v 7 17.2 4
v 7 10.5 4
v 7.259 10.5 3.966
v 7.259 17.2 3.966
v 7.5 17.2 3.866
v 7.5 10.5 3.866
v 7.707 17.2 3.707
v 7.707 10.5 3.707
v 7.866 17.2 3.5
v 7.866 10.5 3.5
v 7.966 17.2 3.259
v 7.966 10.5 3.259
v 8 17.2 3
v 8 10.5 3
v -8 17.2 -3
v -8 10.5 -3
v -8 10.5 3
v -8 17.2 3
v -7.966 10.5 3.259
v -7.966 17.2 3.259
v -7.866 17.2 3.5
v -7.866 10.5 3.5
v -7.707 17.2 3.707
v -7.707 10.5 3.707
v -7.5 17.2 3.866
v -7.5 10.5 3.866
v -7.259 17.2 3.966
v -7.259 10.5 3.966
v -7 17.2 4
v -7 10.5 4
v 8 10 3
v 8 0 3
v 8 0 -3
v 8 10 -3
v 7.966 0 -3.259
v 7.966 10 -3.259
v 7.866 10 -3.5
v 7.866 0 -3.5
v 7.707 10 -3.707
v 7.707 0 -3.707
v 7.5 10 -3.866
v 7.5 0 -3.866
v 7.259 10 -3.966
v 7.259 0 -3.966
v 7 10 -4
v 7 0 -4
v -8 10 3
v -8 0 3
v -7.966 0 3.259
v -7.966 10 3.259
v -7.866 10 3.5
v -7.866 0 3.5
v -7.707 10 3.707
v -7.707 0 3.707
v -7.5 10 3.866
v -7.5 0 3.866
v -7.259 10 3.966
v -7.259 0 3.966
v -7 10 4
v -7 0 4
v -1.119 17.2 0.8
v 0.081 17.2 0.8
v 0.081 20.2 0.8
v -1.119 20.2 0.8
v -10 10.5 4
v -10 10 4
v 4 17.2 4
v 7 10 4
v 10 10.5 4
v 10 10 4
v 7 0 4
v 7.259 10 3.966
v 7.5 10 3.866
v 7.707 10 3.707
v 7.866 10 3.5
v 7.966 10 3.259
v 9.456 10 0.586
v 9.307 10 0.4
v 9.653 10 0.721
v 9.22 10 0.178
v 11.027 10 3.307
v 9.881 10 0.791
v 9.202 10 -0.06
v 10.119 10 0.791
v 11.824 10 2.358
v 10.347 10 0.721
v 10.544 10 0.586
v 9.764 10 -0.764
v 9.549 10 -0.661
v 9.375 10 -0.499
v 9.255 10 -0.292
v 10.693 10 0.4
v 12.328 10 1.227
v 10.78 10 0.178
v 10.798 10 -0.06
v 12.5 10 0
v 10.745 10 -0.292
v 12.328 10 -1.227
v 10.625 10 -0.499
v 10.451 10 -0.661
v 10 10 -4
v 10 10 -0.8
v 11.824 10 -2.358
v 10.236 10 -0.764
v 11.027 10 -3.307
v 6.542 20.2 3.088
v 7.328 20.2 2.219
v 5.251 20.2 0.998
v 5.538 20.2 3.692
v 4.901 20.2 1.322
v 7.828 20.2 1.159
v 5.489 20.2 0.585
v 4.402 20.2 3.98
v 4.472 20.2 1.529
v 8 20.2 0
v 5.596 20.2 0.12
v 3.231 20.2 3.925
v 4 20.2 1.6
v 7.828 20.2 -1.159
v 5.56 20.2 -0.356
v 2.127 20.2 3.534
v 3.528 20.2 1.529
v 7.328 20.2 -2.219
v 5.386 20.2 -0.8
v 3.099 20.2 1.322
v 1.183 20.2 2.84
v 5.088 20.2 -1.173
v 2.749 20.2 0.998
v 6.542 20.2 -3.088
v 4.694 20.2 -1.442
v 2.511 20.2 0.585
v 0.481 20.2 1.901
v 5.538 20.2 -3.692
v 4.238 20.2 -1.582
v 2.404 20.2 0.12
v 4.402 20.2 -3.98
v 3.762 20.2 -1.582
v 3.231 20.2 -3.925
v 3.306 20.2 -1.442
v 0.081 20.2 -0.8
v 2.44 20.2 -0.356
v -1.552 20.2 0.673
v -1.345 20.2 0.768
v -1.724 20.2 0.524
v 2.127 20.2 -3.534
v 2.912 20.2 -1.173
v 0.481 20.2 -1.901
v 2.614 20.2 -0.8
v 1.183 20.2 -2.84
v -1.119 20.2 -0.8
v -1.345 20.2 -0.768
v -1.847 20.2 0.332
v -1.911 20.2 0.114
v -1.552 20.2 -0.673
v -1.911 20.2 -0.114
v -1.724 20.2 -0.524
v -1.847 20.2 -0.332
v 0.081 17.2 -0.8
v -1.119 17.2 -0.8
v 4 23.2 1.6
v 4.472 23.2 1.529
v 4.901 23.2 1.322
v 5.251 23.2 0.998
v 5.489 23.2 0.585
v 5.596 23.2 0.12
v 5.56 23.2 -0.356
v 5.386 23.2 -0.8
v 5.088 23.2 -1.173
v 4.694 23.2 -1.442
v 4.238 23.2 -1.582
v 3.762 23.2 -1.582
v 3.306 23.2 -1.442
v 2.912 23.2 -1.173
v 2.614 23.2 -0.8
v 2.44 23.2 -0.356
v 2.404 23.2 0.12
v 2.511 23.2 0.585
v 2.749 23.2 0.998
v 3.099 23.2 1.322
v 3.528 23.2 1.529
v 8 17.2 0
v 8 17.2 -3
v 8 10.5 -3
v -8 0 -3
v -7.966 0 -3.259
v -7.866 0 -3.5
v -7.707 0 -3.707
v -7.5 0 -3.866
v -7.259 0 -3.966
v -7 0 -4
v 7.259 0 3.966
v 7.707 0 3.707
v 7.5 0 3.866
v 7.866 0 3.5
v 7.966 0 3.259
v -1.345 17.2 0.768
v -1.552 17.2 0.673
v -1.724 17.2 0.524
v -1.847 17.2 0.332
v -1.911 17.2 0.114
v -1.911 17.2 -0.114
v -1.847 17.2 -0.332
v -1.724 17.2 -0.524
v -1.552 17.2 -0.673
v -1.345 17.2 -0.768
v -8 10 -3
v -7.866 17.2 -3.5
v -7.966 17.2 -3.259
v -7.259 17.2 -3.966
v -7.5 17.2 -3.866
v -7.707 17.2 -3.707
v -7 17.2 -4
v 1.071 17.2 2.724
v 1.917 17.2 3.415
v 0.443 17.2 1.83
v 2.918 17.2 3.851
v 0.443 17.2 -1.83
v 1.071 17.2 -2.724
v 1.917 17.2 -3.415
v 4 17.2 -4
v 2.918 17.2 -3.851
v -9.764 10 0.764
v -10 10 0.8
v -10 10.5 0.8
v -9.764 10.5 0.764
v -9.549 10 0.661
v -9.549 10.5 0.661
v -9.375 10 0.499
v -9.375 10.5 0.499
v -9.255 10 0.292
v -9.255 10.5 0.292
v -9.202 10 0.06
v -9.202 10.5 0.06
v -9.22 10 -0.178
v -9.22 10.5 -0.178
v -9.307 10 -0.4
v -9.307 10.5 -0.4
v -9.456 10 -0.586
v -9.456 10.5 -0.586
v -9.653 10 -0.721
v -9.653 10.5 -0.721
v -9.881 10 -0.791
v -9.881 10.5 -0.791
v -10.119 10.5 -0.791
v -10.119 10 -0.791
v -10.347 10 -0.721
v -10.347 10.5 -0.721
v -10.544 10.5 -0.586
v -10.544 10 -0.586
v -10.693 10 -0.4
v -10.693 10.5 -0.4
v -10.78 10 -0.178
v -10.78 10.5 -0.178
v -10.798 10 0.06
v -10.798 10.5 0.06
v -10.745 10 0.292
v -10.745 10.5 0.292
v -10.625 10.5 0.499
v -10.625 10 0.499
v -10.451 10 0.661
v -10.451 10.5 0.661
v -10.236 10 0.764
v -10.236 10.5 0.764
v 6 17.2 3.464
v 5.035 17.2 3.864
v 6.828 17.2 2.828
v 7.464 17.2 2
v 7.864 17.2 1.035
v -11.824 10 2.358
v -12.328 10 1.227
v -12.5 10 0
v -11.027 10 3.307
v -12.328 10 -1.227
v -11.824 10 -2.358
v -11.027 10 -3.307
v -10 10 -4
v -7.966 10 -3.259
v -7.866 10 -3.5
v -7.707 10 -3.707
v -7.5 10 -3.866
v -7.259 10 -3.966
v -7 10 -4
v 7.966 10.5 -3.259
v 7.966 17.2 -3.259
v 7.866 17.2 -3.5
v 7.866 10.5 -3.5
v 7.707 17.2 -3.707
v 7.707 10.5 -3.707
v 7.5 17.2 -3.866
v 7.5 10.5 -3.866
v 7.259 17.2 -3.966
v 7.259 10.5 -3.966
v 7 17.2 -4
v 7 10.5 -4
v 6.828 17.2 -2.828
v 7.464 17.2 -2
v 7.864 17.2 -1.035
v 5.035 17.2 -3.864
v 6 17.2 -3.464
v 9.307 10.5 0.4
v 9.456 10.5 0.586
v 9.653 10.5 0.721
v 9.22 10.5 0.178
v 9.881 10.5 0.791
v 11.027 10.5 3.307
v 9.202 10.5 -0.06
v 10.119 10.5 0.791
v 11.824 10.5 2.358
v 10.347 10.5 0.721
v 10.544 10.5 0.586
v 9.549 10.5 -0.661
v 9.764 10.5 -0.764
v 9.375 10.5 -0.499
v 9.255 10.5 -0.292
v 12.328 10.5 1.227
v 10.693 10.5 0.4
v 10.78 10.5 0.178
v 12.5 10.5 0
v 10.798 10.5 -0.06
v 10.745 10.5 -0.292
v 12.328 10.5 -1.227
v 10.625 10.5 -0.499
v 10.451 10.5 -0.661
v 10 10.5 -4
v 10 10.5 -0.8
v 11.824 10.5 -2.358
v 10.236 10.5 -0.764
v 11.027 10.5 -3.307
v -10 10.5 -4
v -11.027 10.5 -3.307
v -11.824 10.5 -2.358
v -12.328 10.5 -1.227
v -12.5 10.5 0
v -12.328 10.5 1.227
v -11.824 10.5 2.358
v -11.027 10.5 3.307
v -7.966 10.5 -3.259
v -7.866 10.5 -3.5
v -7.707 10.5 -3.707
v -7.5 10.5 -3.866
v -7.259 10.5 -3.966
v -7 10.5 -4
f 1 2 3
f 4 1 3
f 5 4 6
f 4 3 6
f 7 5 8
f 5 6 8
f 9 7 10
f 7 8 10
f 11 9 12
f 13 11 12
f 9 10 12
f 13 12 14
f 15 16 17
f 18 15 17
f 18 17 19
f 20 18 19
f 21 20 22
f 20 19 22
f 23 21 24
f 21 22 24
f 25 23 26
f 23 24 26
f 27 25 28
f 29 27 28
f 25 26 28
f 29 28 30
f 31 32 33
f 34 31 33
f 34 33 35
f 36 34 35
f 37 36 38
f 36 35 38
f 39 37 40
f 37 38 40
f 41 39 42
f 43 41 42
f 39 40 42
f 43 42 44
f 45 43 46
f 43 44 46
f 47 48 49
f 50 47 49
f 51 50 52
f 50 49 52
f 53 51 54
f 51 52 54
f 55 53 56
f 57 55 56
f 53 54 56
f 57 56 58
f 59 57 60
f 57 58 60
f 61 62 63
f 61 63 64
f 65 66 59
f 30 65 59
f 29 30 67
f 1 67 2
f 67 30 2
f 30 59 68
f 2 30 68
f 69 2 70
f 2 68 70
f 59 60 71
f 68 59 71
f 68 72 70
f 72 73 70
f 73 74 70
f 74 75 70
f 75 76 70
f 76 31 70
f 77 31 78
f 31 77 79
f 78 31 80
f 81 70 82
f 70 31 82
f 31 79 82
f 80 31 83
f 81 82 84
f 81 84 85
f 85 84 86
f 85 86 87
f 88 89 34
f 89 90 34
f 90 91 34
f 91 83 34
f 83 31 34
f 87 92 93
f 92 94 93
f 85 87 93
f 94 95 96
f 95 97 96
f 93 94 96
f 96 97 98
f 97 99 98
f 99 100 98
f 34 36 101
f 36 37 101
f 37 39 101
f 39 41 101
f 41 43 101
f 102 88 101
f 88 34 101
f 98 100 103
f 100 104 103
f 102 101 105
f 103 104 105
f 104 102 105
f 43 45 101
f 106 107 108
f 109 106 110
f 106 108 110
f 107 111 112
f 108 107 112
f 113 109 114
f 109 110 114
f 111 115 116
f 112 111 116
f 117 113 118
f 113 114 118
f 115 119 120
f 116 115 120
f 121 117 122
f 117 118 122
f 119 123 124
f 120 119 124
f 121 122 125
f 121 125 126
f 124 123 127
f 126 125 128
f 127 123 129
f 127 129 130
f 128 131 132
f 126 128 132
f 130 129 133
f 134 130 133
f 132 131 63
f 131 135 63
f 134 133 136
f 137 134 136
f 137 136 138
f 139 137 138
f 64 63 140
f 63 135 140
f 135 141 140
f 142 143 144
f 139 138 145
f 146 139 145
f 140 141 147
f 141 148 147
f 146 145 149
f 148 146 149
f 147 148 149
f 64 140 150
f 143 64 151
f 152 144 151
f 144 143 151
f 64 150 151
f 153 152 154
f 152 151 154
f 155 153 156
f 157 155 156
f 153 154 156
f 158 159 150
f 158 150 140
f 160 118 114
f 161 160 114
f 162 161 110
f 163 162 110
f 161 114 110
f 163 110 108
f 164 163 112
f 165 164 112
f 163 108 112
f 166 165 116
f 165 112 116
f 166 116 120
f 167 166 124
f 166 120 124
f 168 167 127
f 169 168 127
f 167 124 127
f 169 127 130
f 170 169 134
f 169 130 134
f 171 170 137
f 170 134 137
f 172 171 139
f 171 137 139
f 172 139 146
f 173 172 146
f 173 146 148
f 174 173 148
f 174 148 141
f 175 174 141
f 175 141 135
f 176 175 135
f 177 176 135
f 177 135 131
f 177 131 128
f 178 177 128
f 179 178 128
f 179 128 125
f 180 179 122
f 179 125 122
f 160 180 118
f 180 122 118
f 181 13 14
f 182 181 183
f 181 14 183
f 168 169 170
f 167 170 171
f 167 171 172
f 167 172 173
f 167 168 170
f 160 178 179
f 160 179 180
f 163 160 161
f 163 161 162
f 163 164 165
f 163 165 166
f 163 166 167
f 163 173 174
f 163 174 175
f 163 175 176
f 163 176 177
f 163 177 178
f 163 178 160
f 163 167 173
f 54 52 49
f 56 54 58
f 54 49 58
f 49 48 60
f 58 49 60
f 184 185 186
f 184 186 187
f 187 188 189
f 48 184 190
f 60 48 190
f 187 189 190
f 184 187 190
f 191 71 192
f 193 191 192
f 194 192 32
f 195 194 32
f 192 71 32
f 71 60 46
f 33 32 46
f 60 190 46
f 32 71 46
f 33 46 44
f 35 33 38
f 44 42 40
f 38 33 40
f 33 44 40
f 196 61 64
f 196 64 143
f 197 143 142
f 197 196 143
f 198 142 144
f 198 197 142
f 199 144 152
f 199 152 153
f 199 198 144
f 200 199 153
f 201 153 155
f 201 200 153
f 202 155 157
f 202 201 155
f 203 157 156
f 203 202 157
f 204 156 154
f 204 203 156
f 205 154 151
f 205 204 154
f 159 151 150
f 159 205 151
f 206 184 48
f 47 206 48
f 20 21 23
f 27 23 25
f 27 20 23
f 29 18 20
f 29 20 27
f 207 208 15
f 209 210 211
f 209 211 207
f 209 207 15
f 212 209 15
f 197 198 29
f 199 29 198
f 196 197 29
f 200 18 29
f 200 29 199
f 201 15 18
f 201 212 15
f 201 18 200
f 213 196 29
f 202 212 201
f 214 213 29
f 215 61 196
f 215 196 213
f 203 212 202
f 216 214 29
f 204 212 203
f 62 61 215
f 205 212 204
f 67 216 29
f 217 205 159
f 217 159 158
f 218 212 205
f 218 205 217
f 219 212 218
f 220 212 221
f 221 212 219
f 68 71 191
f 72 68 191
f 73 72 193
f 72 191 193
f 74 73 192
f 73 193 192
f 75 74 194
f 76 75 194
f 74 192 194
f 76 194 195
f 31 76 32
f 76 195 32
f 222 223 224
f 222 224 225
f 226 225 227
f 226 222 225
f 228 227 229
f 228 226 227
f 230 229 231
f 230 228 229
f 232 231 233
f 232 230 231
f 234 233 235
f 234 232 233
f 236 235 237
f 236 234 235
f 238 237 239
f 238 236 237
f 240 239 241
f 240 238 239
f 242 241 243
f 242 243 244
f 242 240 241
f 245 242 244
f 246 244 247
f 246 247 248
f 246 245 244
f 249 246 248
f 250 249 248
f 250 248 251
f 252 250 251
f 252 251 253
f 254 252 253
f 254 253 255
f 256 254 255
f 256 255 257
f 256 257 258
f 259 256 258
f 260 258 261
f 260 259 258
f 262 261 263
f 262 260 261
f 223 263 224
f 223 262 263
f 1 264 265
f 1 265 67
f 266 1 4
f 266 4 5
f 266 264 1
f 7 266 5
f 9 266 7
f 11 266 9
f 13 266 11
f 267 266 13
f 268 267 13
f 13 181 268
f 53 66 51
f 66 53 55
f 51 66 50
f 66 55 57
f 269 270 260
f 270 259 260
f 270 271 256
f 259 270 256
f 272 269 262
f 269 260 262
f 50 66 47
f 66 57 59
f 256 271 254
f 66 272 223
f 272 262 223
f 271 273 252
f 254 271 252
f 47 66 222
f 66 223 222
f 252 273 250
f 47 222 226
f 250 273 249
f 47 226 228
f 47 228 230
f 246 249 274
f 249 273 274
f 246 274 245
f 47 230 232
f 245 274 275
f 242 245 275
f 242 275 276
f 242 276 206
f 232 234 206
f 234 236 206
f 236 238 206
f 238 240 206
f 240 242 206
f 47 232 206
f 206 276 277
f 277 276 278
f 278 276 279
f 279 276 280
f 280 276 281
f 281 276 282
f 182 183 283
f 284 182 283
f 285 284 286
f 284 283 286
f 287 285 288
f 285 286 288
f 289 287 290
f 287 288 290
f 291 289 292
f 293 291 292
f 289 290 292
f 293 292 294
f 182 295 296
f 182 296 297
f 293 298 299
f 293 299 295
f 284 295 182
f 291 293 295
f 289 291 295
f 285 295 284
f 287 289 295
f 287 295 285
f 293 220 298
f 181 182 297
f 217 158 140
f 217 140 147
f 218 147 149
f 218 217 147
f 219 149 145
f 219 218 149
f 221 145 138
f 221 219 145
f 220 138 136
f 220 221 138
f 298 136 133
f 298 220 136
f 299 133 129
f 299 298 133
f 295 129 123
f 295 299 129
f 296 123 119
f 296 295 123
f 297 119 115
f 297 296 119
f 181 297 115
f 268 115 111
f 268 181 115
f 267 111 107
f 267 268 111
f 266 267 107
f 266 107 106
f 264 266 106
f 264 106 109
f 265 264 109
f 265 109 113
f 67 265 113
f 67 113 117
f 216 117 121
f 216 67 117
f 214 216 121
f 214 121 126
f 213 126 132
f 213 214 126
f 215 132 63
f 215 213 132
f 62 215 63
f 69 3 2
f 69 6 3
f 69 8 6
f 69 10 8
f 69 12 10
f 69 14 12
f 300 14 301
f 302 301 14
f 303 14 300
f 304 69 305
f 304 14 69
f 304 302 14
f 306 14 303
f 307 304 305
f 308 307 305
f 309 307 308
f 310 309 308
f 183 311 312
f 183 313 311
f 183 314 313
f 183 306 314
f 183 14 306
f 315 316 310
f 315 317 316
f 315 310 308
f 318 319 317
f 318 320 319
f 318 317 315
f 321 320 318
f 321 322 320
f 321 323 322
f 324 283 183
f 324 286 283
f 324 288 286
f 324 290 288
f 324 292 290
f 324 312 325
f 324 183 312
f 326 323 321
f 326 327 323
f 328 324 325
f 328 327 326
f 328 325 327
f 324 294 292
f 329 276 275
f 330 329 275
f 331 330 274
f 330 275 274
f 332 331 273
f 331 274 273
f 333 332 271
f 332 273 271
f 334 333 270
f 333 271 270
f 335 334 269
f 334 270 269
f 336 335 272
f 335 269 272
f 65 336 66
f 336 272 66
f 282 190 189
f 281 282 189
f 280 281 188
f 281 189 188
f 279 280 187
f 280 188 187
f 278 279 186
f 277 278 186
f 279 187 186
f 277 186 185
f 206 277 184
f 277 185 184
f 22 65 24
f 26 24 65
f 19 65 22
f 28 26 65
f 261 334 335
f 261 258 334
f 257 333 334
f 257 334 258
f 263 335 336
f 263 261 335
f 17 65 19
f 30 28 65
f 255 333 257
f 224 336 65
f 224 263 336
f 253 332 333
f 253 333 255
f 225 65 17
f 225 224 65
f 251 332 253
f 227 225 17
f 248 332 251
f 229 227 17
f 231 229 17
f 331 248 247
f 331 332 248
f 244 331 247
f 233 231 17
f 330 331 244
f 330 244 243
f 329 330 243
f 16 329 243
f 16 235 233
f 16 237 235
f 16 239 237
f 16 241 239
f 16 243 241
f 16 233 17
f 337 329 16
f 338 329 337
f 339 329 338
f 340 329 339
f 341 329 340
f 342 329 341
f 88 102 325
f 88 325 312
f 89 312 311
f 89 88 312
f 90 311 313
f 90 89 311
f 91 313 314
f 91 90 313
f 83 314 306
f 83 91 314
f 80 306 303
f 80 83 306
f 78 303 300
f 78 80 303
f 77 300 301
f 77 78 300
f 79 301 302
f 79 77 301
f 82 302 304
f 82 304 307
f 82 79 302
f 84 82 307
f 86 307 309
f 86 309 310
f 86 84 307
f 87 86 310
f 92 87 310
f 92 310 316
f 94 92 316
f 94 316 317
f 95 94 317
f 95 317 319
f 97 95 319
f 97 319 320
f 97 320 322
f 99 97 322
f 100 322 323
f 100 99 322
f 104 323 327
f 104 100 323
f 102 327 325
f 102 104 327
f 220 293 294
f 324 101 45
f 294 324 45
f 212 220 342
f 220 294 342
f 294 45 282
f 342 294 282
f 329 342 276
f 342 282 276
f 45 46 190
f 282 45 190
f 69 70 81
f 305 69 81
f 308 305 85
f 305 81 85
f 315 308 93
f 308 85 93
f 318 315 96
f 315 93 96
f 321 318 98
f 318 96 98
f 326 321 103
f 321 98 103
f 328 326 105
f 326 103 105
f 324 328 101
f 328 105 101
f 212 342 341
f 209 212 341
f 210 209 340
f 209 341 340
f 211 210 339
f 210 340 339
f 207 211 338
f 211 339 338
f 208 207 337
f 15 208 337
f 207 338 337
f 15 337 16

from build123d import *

# Parameters (mm, degrees)
EXTRUDE_1_DEPTH = 10
SKETCH_2_R      = 0.8
EXTRUDE_2_DEPTH = 0.5
EXTRUDE_3_DEPTH = 6.7
EXTRUDE_4_DEPTH = 3
SKETCH_5_R      = 1.6
EXTRUDE_5_DEPTH = 3


with BuildPart() as part:
    # 草图1 → 凸台-拉伸1 (new body)
    with BuildSketch(Plane(origin=(0, 0, 0), x_dir=(1, 0, 0), z_dir=(0, 1, 0))):
        with BuildLine():
            Line((-7, -4), (7, -4))
            ThreePointArc((7, -4), (7.707106781, -3.707106781), (8, -3))
            Line((8, -3), (8, 3))
            ThreePointArc((8, 3), (7.707106781, 3.707106781), (7, 4))
            Line((7, 4), (-7, 4))
            ThreePointArc((-7, 4), (-7.707106781, 3.707106781), (-8, 3))
            Line((-8, 3), (-8, -3))
            ThreePointArc((-8, -3), (-7.707106781, -3.707106781), (-7, -4))
        make_face()
    extrude(amount=EXTRUDE_1_DEPTH)

    # 草图2 → 凸台-拉伸2 (add)
    with BuildSketch(Plane(origin=(0, 10, 0), x_dir=(1, 0, 0), z_dir=(0, 1, 0))):
        with BuildLine():
            Line((-10, -4), (10, -4))
            ThreePointArc((10, -4), (12.5, 0), (10, 4))
            Line((10, 4), (-10, 4))
            ThreePointArc((-10, 4), (-12.5, 0), (-10, -4))
        make_face()
        with Locations(Location((-10, 0, 0), (0, 0, 270))):
            Circle(SKETCH_2_R, mode=Mode.SUBTRACT)
        with Locations(Location((10, 0, 0), (0, 0, 90))):
            Circle(SKETCH_2_R, mode=Mode.SUBTRACT)
    extrude(amount=EXTRUDE_2_DEPTH)

    # 草图3 → 凸台-拉伸3 (add)
    with BuildSketch(Plane(origin=(0, 10.5, 0), x_dir=(1, 0, 0), z_dir=(0, 1, 0))):
        with BuildLine():
            Line((7, 4), (-7, 4))
            ThreePointArc((-7, 4), (-7.707106781, 3.707106781), (-8, 3))
            Line((-8, 3), (-8, -3))
            ThreePointArc((-8, -3), (-7.707106781, -3.707106781), (-7, -4))
            Line((-7, -4), (7, -4))
            ThreePointArc((7, -4), (7.707106781, -3.707106781), (8, -3))
            Line((8, -3), (8, 3))
            ThreePointArc((8, 3), (7.707106781, 3.707106781), (7, 4))
        make_face()
    extrude(amount=EXTRUDE_3_DEPTH)

    # 草图4 → 凸台-拉伸4 (add)
    with BuildSketch(Plane(origin=(0, 17.2, 0), x_dir=(1, 0, 0), z_dir=(0, 1, 0))):
        with BuildLine():
            Line((-1.119183588, 0.8), (0.080816412, 0.8))
            ThreePointArc((0.080816412, 0.8), (8, 0), (0.080816412, -0.8))
            Line((0.080816412, -0.8), (-1.119183588, -0.8))
            ThreePointArc((-1.119183588, -0.8), (-1.919183588, 0), (-1.119183588, 0.8))
        make_face()
    extrude(amount=EXTRUDE_4_DEPTH)

    # 草图5 → 凸台-拉伸5 (add)
    with BuildSketch(Plane(origin=(0, 20.2, 0), x_dir=(1, 0, 0), z_dir=(0, 1, 0))):
        with Locations(Location((4, 0, 0), (0, 0, 270))):
            Circle(SKETCH_5_R)
    extrude(amount=EXTRUDE_5_DEPTH)


solid = part.part
